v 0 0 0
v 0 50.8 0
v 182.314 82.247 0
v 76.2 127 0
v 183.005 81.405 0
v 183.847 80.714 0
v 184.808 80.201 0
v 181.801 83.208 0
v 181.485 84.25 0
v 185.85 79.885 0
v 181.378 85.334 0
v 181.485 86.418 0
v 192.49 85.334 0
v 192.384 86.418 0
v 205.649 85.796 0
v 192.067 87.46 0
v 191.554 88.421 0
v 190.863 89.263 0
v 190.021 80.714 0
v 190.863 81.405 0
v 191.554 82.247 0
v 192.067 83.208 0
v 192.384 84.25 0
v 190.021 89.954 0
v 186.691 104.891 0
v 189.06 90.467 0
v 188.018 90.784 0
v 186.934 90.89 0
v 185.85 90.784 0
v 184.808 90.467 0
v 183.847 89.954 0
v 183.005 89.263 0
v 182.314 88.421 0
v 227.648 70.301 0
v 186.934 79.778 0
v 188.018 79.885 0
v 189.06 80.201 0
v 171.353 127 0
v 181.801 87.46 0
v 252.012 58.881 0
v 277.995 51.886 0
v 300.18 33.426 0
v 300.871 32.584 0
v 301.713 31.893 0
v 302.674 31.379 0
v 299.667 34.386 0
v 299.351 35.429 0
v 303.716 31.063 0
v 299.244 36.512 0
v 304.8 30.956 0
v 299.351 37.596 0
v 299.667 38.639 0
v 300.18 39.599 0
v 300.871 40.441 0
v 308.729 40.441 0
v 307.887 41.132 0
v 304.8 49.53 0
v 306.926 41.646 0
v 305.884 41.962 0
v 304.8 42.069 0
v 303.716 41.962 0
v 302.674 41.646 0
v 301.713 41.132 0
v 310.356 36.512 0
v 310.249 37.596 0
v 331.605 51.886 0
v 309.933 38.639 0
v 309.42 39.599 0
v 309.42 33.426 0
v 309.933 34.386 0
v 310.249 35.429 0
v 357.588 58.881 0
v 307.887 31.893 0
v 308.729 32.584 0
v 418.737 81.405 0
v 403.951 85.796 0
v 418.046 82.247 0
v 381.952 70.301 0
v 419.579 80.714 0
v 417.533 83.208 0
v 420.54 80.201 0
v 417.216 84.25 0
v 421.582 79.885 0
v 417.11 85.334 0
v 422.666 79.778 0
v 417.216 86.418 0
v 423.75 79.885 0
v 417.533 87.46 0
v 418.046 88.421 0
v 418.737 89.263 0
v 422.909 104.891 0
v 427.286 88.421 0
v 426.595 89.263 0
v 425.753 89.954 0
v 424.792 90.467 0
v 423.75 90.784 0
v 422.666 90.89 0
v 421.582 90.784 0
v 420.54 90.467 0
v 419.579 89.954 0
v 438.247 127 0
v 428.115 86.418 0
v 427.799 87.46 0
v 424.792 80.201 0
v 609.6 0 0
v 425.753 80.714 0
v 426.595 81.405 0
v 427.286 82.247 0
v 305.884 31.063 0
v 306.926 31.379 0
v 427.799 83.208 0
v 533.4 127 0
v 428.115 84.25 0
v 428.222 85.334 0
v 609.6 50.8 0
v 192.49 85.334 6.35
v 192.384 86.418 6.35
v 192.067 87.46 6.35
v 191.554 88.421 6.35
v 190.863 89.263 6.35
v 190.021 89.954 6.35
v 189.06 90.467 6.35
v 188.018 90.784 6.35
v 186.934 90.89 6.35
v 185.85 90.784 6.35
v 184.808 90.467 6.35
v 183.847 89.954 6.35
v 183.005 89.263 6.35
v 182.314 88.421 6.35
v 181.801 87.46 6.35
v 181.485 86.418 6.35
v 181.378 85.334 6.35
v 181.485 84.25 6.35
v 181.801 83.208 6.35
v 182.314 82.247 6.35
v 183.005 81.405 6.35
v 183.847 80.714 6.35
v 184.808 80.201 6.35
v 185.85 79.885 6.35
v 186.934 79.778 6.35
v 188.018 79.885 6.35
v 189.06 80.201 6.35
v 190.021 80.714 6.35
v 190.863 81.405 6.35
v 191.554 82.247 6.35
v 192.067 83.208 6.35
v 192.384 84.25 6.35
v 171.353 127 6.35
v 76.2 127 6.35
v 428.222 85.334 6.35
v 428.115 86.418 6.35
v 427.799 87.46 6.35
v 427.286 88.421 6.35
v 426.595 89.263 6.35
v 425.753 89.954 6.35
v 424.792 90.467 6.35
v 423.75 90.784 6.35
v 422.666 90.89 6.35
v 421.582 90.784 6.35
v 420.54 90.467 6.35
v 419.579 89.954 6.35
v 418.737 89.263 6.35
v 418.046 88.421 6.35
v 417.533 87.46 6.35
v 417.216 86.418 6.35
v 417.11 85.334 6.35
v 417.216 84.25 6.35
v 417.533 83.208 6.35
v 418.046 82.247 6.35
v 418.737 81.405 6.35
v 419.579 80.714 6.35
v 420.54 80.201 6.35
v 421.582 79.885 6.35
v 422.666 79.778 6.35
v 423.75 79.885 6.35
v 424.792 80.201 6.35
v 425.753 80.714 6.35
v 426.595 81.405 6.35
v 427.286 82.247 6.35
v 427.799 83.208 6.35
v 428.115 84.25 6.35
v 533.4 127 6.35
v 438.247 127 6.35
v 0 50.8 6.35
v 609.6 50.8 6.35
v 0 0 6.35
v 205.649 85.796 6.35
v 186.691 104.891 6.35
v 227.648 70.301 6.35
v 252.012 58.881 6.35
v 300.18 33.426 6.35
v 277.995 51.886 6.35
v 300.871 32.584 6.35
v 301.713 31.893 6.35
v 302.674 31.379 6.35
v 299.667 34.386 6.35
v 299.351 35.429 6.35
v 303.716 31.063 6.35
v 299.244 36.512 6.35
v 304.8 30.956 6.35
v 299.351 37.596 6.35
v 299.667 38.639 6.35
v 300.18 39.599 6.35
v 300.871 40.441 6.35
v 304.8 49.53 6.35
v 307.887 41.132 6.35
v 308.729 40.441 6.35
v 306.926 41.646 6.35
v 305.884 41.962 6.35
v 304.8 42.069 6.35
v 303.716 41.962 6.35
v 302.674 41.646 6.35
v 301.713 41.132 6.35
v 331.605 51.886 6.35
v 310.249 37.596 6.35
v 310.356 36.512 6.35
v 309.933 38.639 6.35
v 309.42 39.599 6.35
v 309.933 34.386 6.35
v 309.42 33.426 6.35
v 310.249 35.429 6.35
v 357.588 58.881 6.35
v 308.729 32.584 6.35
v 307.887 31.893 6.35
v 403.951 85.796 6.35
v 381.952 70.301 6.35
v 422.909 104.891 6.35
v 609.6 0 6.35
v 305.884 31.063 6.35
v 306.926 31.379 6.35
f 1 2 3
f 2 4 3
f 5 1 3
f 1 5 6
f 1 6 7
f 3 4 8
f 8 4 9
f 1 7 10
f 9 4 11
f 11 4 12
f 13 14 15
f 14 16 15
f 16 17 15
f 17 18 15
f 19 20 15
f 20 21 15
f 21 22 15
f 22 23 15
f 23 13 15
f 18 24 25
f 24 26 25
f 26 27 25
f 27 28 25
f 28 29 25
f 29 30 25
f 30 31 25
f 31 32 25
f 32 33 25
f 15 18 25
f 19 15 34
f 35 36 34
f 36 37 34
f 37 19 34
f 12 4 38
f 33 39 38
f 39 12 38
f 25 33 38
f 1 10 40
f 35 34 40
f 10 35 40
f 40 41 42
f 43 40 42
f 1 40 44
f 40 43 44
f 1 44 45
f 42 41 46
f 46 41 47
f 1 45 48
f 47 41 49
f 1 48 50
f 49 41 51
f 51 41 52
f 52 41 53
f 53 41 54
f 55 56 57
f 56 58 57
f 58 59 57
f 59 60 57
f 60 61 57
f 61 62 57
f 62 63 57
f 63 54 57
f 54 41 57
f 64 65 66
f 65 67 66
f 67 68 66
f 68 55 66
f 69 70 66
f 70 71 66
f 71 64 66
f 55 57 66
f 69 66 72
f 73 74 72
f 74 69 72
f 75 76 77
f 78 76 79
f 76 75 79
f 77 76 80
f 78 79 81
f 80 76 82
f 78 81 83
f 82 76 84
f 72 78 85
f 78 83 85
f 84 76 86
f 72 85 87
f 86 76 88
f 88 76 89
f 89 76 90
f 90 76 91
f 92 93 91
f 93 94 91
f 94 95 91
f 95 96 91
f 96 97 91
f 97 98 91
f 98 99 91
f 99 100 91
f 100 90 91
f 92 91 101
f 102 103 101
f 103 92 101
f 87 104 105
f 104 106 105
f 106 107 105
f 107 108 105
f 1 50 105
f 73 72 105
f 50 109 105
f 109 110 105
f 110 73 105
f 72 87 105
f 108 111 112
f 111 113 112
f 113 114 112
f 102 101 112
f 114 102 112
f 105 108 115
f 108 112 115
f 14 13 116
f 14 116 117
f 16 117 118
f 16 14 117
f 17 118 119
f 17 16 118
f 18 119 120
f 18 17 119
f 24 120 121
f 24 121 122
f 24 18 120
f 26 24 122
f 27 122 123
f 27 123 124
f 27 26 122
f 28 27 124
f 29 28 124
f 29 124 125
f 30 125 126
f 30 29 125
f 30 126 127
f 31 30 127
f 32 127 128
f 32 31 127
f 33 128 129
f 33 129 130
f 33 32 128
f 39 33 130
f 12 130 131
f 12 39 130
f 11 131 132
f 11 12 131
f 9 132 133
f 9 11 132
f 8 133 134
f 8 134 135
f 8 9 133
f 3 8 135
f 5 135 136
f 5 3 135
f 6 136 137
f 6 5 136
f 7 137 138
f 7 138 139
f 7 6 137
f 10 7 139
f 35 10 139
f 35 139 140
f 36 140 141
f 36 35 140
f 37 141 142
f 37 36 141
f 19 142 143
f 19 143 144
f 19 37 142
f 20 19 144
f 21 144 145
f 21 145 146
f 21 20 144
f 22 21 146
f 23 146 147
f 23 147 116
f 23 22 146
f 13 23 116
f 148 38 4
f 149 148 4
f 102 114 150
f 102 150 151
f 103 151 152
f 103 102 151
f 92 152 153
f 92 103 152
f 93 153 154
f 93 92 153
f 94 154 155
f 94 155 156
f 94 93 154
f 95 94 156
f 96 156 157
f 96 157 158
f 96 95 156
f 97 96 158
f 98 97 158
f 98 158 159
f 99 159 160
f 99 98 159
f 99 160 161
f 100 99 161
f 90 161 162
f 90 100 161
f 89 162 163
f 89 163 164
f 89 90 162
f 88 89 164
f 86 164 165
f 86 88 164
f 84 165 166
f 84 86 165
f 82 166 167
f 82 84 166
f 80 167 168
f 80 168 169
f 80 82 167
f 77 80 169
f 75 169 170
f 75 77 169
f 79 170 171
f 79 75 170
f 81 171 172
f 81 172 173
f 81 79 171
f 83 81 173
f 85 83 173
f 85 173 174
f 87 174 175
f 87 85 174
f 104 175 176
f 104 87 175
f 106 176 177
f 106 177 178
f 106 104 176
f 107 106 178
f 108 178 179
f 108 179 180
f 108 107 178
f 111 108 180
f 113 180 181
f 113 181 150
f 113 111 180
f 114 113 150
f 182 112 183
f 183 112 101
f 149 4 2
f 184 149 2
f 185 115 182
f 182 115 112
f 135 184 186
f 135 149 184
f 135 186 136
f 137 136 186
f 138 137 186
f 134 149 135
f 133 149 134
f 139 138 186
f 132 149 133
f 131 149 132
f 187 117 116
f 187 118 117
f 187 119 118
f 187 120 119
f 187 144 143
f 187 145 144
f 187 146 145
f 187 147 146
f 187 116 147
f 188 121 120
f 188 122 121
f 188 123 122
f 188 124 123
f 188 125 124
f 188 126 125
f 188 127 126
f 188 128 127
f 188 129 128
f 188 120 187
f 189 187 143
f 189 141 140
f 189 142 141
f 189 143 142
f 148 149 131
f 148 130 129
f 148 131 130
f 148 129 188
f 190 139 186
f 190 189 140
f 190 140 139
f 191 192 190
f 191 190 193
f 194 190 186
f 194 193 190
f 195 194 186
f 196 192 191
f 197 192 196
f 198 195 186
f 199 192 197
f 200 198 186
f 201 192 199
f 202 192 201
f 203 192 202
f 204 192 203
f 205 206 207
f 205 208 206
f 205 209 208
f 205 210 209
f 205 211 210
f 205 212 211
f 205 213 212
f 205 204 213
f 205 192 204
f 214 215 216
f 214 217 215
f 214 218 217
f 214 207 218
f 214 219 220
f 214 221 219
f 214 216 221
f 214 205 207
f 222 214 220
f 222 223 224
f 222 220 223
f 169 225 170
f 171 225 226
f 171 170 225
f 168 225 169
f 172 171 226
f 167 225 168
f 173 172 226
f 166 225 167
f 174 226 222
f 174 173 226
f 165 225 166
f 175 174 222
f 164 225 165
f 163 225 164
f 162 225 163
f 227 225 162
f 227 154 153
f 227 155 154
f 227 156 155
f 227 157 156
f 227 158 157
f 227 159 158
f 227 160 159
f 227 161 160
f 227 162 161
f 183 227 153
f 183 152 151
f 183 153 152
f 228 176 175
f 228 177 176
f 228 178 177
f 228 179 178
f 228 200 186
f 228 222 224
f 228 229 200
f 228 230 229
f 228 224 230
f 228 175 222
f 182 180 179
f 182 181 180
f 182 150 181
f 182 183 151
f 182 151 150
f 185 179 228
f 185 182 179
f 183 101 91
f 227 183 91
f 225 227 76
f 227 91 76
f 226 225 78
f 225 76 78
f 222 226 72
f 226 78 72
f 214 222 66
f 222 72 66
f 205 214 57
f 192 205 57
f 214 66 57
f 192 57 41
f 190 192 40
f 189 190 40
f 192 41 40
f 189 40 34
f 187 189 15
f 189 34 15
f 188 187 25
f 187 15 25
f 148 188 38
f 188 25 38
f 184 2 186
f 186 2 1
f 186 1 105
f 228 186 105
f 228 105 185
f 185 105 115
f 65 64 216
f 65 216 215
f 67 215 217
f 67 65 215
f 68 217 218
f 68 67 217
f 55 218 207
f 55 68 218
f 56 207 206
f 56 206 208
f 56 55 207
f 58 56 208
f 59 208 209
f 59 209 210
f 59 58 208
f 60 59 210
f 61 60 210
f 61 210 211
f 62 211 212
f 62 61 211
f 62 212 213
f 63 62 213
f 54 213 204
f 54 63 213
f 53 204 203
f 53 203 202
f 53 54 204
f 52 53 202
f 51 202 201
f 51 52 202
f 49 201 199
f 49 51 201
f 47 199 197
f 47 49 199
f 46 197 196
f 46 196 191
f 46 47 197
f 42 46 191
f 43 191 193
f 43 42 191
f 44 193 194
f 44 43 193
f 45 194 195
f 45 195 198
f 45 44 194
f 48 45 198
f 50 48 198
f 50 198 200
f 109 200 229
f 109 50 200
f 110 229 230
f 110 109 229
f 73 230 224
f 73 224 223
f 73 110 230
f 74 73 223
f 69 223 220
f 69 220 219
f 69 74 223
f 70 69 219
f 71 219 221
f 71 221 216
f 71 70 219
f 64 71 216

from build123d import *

# Parameters (mm, degrees)
F0_R     = 5.55625
F1_DEPTH = 6.35


with BuildPart() as f1:
    # F0 (on Top) → F1 (new body)
    with BuildSketch(Plane.XY):
        with BuildLine():
            Line((0, 50.8), (0, 0))
            Line((0, 0), (609.6, 0))
            Line((609.6, 0), (609.6, 50.8))
            Line((609.6, 50.8), (533.4, 127))
            Line((533.4, 127), (438.246727, 127))
            ThreePointArc((438.246727, 127), (304.8, 49.53), (171.353273, 127))
            Line((171.353273, 127), (76.2, 127))
            Line((76.2, 127), (0, 50.8))
        make_face()
        with Locations((304.8, 36.5125)):
            Circle(F0_R, mode=Mode.SUBTRACT)
        with Locations((186.934138, 85.334138)):
            Circle(F0_R, mode=Mode.SUBTRACT)
        with Locations((422.665862, 85.334138)):
            Circle(F0_R, mode=Mode.SUBTRACT)
    extrude(amount=F1_DEPTH)


solid = f1.part
